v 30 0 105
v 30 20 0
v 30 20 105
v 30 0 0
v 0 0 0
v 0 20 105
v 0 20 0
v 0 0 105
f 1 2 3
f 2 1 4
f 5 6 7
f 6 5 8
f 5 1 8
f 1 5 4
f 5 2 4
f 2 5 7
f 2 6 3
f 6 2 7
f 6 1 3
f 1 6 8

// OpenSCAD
harmonicaHeight = 30;
harmonicaLength = 105;
harmonicaThickness = 20;

module harmonicaBody() {
    cube([harmonicaLength, harmonicaThickness, harmonicaHeight]);
}

rotate([0,90,0])
  translate([-harmonicaLength,0,0])
  harmonicaBody();
